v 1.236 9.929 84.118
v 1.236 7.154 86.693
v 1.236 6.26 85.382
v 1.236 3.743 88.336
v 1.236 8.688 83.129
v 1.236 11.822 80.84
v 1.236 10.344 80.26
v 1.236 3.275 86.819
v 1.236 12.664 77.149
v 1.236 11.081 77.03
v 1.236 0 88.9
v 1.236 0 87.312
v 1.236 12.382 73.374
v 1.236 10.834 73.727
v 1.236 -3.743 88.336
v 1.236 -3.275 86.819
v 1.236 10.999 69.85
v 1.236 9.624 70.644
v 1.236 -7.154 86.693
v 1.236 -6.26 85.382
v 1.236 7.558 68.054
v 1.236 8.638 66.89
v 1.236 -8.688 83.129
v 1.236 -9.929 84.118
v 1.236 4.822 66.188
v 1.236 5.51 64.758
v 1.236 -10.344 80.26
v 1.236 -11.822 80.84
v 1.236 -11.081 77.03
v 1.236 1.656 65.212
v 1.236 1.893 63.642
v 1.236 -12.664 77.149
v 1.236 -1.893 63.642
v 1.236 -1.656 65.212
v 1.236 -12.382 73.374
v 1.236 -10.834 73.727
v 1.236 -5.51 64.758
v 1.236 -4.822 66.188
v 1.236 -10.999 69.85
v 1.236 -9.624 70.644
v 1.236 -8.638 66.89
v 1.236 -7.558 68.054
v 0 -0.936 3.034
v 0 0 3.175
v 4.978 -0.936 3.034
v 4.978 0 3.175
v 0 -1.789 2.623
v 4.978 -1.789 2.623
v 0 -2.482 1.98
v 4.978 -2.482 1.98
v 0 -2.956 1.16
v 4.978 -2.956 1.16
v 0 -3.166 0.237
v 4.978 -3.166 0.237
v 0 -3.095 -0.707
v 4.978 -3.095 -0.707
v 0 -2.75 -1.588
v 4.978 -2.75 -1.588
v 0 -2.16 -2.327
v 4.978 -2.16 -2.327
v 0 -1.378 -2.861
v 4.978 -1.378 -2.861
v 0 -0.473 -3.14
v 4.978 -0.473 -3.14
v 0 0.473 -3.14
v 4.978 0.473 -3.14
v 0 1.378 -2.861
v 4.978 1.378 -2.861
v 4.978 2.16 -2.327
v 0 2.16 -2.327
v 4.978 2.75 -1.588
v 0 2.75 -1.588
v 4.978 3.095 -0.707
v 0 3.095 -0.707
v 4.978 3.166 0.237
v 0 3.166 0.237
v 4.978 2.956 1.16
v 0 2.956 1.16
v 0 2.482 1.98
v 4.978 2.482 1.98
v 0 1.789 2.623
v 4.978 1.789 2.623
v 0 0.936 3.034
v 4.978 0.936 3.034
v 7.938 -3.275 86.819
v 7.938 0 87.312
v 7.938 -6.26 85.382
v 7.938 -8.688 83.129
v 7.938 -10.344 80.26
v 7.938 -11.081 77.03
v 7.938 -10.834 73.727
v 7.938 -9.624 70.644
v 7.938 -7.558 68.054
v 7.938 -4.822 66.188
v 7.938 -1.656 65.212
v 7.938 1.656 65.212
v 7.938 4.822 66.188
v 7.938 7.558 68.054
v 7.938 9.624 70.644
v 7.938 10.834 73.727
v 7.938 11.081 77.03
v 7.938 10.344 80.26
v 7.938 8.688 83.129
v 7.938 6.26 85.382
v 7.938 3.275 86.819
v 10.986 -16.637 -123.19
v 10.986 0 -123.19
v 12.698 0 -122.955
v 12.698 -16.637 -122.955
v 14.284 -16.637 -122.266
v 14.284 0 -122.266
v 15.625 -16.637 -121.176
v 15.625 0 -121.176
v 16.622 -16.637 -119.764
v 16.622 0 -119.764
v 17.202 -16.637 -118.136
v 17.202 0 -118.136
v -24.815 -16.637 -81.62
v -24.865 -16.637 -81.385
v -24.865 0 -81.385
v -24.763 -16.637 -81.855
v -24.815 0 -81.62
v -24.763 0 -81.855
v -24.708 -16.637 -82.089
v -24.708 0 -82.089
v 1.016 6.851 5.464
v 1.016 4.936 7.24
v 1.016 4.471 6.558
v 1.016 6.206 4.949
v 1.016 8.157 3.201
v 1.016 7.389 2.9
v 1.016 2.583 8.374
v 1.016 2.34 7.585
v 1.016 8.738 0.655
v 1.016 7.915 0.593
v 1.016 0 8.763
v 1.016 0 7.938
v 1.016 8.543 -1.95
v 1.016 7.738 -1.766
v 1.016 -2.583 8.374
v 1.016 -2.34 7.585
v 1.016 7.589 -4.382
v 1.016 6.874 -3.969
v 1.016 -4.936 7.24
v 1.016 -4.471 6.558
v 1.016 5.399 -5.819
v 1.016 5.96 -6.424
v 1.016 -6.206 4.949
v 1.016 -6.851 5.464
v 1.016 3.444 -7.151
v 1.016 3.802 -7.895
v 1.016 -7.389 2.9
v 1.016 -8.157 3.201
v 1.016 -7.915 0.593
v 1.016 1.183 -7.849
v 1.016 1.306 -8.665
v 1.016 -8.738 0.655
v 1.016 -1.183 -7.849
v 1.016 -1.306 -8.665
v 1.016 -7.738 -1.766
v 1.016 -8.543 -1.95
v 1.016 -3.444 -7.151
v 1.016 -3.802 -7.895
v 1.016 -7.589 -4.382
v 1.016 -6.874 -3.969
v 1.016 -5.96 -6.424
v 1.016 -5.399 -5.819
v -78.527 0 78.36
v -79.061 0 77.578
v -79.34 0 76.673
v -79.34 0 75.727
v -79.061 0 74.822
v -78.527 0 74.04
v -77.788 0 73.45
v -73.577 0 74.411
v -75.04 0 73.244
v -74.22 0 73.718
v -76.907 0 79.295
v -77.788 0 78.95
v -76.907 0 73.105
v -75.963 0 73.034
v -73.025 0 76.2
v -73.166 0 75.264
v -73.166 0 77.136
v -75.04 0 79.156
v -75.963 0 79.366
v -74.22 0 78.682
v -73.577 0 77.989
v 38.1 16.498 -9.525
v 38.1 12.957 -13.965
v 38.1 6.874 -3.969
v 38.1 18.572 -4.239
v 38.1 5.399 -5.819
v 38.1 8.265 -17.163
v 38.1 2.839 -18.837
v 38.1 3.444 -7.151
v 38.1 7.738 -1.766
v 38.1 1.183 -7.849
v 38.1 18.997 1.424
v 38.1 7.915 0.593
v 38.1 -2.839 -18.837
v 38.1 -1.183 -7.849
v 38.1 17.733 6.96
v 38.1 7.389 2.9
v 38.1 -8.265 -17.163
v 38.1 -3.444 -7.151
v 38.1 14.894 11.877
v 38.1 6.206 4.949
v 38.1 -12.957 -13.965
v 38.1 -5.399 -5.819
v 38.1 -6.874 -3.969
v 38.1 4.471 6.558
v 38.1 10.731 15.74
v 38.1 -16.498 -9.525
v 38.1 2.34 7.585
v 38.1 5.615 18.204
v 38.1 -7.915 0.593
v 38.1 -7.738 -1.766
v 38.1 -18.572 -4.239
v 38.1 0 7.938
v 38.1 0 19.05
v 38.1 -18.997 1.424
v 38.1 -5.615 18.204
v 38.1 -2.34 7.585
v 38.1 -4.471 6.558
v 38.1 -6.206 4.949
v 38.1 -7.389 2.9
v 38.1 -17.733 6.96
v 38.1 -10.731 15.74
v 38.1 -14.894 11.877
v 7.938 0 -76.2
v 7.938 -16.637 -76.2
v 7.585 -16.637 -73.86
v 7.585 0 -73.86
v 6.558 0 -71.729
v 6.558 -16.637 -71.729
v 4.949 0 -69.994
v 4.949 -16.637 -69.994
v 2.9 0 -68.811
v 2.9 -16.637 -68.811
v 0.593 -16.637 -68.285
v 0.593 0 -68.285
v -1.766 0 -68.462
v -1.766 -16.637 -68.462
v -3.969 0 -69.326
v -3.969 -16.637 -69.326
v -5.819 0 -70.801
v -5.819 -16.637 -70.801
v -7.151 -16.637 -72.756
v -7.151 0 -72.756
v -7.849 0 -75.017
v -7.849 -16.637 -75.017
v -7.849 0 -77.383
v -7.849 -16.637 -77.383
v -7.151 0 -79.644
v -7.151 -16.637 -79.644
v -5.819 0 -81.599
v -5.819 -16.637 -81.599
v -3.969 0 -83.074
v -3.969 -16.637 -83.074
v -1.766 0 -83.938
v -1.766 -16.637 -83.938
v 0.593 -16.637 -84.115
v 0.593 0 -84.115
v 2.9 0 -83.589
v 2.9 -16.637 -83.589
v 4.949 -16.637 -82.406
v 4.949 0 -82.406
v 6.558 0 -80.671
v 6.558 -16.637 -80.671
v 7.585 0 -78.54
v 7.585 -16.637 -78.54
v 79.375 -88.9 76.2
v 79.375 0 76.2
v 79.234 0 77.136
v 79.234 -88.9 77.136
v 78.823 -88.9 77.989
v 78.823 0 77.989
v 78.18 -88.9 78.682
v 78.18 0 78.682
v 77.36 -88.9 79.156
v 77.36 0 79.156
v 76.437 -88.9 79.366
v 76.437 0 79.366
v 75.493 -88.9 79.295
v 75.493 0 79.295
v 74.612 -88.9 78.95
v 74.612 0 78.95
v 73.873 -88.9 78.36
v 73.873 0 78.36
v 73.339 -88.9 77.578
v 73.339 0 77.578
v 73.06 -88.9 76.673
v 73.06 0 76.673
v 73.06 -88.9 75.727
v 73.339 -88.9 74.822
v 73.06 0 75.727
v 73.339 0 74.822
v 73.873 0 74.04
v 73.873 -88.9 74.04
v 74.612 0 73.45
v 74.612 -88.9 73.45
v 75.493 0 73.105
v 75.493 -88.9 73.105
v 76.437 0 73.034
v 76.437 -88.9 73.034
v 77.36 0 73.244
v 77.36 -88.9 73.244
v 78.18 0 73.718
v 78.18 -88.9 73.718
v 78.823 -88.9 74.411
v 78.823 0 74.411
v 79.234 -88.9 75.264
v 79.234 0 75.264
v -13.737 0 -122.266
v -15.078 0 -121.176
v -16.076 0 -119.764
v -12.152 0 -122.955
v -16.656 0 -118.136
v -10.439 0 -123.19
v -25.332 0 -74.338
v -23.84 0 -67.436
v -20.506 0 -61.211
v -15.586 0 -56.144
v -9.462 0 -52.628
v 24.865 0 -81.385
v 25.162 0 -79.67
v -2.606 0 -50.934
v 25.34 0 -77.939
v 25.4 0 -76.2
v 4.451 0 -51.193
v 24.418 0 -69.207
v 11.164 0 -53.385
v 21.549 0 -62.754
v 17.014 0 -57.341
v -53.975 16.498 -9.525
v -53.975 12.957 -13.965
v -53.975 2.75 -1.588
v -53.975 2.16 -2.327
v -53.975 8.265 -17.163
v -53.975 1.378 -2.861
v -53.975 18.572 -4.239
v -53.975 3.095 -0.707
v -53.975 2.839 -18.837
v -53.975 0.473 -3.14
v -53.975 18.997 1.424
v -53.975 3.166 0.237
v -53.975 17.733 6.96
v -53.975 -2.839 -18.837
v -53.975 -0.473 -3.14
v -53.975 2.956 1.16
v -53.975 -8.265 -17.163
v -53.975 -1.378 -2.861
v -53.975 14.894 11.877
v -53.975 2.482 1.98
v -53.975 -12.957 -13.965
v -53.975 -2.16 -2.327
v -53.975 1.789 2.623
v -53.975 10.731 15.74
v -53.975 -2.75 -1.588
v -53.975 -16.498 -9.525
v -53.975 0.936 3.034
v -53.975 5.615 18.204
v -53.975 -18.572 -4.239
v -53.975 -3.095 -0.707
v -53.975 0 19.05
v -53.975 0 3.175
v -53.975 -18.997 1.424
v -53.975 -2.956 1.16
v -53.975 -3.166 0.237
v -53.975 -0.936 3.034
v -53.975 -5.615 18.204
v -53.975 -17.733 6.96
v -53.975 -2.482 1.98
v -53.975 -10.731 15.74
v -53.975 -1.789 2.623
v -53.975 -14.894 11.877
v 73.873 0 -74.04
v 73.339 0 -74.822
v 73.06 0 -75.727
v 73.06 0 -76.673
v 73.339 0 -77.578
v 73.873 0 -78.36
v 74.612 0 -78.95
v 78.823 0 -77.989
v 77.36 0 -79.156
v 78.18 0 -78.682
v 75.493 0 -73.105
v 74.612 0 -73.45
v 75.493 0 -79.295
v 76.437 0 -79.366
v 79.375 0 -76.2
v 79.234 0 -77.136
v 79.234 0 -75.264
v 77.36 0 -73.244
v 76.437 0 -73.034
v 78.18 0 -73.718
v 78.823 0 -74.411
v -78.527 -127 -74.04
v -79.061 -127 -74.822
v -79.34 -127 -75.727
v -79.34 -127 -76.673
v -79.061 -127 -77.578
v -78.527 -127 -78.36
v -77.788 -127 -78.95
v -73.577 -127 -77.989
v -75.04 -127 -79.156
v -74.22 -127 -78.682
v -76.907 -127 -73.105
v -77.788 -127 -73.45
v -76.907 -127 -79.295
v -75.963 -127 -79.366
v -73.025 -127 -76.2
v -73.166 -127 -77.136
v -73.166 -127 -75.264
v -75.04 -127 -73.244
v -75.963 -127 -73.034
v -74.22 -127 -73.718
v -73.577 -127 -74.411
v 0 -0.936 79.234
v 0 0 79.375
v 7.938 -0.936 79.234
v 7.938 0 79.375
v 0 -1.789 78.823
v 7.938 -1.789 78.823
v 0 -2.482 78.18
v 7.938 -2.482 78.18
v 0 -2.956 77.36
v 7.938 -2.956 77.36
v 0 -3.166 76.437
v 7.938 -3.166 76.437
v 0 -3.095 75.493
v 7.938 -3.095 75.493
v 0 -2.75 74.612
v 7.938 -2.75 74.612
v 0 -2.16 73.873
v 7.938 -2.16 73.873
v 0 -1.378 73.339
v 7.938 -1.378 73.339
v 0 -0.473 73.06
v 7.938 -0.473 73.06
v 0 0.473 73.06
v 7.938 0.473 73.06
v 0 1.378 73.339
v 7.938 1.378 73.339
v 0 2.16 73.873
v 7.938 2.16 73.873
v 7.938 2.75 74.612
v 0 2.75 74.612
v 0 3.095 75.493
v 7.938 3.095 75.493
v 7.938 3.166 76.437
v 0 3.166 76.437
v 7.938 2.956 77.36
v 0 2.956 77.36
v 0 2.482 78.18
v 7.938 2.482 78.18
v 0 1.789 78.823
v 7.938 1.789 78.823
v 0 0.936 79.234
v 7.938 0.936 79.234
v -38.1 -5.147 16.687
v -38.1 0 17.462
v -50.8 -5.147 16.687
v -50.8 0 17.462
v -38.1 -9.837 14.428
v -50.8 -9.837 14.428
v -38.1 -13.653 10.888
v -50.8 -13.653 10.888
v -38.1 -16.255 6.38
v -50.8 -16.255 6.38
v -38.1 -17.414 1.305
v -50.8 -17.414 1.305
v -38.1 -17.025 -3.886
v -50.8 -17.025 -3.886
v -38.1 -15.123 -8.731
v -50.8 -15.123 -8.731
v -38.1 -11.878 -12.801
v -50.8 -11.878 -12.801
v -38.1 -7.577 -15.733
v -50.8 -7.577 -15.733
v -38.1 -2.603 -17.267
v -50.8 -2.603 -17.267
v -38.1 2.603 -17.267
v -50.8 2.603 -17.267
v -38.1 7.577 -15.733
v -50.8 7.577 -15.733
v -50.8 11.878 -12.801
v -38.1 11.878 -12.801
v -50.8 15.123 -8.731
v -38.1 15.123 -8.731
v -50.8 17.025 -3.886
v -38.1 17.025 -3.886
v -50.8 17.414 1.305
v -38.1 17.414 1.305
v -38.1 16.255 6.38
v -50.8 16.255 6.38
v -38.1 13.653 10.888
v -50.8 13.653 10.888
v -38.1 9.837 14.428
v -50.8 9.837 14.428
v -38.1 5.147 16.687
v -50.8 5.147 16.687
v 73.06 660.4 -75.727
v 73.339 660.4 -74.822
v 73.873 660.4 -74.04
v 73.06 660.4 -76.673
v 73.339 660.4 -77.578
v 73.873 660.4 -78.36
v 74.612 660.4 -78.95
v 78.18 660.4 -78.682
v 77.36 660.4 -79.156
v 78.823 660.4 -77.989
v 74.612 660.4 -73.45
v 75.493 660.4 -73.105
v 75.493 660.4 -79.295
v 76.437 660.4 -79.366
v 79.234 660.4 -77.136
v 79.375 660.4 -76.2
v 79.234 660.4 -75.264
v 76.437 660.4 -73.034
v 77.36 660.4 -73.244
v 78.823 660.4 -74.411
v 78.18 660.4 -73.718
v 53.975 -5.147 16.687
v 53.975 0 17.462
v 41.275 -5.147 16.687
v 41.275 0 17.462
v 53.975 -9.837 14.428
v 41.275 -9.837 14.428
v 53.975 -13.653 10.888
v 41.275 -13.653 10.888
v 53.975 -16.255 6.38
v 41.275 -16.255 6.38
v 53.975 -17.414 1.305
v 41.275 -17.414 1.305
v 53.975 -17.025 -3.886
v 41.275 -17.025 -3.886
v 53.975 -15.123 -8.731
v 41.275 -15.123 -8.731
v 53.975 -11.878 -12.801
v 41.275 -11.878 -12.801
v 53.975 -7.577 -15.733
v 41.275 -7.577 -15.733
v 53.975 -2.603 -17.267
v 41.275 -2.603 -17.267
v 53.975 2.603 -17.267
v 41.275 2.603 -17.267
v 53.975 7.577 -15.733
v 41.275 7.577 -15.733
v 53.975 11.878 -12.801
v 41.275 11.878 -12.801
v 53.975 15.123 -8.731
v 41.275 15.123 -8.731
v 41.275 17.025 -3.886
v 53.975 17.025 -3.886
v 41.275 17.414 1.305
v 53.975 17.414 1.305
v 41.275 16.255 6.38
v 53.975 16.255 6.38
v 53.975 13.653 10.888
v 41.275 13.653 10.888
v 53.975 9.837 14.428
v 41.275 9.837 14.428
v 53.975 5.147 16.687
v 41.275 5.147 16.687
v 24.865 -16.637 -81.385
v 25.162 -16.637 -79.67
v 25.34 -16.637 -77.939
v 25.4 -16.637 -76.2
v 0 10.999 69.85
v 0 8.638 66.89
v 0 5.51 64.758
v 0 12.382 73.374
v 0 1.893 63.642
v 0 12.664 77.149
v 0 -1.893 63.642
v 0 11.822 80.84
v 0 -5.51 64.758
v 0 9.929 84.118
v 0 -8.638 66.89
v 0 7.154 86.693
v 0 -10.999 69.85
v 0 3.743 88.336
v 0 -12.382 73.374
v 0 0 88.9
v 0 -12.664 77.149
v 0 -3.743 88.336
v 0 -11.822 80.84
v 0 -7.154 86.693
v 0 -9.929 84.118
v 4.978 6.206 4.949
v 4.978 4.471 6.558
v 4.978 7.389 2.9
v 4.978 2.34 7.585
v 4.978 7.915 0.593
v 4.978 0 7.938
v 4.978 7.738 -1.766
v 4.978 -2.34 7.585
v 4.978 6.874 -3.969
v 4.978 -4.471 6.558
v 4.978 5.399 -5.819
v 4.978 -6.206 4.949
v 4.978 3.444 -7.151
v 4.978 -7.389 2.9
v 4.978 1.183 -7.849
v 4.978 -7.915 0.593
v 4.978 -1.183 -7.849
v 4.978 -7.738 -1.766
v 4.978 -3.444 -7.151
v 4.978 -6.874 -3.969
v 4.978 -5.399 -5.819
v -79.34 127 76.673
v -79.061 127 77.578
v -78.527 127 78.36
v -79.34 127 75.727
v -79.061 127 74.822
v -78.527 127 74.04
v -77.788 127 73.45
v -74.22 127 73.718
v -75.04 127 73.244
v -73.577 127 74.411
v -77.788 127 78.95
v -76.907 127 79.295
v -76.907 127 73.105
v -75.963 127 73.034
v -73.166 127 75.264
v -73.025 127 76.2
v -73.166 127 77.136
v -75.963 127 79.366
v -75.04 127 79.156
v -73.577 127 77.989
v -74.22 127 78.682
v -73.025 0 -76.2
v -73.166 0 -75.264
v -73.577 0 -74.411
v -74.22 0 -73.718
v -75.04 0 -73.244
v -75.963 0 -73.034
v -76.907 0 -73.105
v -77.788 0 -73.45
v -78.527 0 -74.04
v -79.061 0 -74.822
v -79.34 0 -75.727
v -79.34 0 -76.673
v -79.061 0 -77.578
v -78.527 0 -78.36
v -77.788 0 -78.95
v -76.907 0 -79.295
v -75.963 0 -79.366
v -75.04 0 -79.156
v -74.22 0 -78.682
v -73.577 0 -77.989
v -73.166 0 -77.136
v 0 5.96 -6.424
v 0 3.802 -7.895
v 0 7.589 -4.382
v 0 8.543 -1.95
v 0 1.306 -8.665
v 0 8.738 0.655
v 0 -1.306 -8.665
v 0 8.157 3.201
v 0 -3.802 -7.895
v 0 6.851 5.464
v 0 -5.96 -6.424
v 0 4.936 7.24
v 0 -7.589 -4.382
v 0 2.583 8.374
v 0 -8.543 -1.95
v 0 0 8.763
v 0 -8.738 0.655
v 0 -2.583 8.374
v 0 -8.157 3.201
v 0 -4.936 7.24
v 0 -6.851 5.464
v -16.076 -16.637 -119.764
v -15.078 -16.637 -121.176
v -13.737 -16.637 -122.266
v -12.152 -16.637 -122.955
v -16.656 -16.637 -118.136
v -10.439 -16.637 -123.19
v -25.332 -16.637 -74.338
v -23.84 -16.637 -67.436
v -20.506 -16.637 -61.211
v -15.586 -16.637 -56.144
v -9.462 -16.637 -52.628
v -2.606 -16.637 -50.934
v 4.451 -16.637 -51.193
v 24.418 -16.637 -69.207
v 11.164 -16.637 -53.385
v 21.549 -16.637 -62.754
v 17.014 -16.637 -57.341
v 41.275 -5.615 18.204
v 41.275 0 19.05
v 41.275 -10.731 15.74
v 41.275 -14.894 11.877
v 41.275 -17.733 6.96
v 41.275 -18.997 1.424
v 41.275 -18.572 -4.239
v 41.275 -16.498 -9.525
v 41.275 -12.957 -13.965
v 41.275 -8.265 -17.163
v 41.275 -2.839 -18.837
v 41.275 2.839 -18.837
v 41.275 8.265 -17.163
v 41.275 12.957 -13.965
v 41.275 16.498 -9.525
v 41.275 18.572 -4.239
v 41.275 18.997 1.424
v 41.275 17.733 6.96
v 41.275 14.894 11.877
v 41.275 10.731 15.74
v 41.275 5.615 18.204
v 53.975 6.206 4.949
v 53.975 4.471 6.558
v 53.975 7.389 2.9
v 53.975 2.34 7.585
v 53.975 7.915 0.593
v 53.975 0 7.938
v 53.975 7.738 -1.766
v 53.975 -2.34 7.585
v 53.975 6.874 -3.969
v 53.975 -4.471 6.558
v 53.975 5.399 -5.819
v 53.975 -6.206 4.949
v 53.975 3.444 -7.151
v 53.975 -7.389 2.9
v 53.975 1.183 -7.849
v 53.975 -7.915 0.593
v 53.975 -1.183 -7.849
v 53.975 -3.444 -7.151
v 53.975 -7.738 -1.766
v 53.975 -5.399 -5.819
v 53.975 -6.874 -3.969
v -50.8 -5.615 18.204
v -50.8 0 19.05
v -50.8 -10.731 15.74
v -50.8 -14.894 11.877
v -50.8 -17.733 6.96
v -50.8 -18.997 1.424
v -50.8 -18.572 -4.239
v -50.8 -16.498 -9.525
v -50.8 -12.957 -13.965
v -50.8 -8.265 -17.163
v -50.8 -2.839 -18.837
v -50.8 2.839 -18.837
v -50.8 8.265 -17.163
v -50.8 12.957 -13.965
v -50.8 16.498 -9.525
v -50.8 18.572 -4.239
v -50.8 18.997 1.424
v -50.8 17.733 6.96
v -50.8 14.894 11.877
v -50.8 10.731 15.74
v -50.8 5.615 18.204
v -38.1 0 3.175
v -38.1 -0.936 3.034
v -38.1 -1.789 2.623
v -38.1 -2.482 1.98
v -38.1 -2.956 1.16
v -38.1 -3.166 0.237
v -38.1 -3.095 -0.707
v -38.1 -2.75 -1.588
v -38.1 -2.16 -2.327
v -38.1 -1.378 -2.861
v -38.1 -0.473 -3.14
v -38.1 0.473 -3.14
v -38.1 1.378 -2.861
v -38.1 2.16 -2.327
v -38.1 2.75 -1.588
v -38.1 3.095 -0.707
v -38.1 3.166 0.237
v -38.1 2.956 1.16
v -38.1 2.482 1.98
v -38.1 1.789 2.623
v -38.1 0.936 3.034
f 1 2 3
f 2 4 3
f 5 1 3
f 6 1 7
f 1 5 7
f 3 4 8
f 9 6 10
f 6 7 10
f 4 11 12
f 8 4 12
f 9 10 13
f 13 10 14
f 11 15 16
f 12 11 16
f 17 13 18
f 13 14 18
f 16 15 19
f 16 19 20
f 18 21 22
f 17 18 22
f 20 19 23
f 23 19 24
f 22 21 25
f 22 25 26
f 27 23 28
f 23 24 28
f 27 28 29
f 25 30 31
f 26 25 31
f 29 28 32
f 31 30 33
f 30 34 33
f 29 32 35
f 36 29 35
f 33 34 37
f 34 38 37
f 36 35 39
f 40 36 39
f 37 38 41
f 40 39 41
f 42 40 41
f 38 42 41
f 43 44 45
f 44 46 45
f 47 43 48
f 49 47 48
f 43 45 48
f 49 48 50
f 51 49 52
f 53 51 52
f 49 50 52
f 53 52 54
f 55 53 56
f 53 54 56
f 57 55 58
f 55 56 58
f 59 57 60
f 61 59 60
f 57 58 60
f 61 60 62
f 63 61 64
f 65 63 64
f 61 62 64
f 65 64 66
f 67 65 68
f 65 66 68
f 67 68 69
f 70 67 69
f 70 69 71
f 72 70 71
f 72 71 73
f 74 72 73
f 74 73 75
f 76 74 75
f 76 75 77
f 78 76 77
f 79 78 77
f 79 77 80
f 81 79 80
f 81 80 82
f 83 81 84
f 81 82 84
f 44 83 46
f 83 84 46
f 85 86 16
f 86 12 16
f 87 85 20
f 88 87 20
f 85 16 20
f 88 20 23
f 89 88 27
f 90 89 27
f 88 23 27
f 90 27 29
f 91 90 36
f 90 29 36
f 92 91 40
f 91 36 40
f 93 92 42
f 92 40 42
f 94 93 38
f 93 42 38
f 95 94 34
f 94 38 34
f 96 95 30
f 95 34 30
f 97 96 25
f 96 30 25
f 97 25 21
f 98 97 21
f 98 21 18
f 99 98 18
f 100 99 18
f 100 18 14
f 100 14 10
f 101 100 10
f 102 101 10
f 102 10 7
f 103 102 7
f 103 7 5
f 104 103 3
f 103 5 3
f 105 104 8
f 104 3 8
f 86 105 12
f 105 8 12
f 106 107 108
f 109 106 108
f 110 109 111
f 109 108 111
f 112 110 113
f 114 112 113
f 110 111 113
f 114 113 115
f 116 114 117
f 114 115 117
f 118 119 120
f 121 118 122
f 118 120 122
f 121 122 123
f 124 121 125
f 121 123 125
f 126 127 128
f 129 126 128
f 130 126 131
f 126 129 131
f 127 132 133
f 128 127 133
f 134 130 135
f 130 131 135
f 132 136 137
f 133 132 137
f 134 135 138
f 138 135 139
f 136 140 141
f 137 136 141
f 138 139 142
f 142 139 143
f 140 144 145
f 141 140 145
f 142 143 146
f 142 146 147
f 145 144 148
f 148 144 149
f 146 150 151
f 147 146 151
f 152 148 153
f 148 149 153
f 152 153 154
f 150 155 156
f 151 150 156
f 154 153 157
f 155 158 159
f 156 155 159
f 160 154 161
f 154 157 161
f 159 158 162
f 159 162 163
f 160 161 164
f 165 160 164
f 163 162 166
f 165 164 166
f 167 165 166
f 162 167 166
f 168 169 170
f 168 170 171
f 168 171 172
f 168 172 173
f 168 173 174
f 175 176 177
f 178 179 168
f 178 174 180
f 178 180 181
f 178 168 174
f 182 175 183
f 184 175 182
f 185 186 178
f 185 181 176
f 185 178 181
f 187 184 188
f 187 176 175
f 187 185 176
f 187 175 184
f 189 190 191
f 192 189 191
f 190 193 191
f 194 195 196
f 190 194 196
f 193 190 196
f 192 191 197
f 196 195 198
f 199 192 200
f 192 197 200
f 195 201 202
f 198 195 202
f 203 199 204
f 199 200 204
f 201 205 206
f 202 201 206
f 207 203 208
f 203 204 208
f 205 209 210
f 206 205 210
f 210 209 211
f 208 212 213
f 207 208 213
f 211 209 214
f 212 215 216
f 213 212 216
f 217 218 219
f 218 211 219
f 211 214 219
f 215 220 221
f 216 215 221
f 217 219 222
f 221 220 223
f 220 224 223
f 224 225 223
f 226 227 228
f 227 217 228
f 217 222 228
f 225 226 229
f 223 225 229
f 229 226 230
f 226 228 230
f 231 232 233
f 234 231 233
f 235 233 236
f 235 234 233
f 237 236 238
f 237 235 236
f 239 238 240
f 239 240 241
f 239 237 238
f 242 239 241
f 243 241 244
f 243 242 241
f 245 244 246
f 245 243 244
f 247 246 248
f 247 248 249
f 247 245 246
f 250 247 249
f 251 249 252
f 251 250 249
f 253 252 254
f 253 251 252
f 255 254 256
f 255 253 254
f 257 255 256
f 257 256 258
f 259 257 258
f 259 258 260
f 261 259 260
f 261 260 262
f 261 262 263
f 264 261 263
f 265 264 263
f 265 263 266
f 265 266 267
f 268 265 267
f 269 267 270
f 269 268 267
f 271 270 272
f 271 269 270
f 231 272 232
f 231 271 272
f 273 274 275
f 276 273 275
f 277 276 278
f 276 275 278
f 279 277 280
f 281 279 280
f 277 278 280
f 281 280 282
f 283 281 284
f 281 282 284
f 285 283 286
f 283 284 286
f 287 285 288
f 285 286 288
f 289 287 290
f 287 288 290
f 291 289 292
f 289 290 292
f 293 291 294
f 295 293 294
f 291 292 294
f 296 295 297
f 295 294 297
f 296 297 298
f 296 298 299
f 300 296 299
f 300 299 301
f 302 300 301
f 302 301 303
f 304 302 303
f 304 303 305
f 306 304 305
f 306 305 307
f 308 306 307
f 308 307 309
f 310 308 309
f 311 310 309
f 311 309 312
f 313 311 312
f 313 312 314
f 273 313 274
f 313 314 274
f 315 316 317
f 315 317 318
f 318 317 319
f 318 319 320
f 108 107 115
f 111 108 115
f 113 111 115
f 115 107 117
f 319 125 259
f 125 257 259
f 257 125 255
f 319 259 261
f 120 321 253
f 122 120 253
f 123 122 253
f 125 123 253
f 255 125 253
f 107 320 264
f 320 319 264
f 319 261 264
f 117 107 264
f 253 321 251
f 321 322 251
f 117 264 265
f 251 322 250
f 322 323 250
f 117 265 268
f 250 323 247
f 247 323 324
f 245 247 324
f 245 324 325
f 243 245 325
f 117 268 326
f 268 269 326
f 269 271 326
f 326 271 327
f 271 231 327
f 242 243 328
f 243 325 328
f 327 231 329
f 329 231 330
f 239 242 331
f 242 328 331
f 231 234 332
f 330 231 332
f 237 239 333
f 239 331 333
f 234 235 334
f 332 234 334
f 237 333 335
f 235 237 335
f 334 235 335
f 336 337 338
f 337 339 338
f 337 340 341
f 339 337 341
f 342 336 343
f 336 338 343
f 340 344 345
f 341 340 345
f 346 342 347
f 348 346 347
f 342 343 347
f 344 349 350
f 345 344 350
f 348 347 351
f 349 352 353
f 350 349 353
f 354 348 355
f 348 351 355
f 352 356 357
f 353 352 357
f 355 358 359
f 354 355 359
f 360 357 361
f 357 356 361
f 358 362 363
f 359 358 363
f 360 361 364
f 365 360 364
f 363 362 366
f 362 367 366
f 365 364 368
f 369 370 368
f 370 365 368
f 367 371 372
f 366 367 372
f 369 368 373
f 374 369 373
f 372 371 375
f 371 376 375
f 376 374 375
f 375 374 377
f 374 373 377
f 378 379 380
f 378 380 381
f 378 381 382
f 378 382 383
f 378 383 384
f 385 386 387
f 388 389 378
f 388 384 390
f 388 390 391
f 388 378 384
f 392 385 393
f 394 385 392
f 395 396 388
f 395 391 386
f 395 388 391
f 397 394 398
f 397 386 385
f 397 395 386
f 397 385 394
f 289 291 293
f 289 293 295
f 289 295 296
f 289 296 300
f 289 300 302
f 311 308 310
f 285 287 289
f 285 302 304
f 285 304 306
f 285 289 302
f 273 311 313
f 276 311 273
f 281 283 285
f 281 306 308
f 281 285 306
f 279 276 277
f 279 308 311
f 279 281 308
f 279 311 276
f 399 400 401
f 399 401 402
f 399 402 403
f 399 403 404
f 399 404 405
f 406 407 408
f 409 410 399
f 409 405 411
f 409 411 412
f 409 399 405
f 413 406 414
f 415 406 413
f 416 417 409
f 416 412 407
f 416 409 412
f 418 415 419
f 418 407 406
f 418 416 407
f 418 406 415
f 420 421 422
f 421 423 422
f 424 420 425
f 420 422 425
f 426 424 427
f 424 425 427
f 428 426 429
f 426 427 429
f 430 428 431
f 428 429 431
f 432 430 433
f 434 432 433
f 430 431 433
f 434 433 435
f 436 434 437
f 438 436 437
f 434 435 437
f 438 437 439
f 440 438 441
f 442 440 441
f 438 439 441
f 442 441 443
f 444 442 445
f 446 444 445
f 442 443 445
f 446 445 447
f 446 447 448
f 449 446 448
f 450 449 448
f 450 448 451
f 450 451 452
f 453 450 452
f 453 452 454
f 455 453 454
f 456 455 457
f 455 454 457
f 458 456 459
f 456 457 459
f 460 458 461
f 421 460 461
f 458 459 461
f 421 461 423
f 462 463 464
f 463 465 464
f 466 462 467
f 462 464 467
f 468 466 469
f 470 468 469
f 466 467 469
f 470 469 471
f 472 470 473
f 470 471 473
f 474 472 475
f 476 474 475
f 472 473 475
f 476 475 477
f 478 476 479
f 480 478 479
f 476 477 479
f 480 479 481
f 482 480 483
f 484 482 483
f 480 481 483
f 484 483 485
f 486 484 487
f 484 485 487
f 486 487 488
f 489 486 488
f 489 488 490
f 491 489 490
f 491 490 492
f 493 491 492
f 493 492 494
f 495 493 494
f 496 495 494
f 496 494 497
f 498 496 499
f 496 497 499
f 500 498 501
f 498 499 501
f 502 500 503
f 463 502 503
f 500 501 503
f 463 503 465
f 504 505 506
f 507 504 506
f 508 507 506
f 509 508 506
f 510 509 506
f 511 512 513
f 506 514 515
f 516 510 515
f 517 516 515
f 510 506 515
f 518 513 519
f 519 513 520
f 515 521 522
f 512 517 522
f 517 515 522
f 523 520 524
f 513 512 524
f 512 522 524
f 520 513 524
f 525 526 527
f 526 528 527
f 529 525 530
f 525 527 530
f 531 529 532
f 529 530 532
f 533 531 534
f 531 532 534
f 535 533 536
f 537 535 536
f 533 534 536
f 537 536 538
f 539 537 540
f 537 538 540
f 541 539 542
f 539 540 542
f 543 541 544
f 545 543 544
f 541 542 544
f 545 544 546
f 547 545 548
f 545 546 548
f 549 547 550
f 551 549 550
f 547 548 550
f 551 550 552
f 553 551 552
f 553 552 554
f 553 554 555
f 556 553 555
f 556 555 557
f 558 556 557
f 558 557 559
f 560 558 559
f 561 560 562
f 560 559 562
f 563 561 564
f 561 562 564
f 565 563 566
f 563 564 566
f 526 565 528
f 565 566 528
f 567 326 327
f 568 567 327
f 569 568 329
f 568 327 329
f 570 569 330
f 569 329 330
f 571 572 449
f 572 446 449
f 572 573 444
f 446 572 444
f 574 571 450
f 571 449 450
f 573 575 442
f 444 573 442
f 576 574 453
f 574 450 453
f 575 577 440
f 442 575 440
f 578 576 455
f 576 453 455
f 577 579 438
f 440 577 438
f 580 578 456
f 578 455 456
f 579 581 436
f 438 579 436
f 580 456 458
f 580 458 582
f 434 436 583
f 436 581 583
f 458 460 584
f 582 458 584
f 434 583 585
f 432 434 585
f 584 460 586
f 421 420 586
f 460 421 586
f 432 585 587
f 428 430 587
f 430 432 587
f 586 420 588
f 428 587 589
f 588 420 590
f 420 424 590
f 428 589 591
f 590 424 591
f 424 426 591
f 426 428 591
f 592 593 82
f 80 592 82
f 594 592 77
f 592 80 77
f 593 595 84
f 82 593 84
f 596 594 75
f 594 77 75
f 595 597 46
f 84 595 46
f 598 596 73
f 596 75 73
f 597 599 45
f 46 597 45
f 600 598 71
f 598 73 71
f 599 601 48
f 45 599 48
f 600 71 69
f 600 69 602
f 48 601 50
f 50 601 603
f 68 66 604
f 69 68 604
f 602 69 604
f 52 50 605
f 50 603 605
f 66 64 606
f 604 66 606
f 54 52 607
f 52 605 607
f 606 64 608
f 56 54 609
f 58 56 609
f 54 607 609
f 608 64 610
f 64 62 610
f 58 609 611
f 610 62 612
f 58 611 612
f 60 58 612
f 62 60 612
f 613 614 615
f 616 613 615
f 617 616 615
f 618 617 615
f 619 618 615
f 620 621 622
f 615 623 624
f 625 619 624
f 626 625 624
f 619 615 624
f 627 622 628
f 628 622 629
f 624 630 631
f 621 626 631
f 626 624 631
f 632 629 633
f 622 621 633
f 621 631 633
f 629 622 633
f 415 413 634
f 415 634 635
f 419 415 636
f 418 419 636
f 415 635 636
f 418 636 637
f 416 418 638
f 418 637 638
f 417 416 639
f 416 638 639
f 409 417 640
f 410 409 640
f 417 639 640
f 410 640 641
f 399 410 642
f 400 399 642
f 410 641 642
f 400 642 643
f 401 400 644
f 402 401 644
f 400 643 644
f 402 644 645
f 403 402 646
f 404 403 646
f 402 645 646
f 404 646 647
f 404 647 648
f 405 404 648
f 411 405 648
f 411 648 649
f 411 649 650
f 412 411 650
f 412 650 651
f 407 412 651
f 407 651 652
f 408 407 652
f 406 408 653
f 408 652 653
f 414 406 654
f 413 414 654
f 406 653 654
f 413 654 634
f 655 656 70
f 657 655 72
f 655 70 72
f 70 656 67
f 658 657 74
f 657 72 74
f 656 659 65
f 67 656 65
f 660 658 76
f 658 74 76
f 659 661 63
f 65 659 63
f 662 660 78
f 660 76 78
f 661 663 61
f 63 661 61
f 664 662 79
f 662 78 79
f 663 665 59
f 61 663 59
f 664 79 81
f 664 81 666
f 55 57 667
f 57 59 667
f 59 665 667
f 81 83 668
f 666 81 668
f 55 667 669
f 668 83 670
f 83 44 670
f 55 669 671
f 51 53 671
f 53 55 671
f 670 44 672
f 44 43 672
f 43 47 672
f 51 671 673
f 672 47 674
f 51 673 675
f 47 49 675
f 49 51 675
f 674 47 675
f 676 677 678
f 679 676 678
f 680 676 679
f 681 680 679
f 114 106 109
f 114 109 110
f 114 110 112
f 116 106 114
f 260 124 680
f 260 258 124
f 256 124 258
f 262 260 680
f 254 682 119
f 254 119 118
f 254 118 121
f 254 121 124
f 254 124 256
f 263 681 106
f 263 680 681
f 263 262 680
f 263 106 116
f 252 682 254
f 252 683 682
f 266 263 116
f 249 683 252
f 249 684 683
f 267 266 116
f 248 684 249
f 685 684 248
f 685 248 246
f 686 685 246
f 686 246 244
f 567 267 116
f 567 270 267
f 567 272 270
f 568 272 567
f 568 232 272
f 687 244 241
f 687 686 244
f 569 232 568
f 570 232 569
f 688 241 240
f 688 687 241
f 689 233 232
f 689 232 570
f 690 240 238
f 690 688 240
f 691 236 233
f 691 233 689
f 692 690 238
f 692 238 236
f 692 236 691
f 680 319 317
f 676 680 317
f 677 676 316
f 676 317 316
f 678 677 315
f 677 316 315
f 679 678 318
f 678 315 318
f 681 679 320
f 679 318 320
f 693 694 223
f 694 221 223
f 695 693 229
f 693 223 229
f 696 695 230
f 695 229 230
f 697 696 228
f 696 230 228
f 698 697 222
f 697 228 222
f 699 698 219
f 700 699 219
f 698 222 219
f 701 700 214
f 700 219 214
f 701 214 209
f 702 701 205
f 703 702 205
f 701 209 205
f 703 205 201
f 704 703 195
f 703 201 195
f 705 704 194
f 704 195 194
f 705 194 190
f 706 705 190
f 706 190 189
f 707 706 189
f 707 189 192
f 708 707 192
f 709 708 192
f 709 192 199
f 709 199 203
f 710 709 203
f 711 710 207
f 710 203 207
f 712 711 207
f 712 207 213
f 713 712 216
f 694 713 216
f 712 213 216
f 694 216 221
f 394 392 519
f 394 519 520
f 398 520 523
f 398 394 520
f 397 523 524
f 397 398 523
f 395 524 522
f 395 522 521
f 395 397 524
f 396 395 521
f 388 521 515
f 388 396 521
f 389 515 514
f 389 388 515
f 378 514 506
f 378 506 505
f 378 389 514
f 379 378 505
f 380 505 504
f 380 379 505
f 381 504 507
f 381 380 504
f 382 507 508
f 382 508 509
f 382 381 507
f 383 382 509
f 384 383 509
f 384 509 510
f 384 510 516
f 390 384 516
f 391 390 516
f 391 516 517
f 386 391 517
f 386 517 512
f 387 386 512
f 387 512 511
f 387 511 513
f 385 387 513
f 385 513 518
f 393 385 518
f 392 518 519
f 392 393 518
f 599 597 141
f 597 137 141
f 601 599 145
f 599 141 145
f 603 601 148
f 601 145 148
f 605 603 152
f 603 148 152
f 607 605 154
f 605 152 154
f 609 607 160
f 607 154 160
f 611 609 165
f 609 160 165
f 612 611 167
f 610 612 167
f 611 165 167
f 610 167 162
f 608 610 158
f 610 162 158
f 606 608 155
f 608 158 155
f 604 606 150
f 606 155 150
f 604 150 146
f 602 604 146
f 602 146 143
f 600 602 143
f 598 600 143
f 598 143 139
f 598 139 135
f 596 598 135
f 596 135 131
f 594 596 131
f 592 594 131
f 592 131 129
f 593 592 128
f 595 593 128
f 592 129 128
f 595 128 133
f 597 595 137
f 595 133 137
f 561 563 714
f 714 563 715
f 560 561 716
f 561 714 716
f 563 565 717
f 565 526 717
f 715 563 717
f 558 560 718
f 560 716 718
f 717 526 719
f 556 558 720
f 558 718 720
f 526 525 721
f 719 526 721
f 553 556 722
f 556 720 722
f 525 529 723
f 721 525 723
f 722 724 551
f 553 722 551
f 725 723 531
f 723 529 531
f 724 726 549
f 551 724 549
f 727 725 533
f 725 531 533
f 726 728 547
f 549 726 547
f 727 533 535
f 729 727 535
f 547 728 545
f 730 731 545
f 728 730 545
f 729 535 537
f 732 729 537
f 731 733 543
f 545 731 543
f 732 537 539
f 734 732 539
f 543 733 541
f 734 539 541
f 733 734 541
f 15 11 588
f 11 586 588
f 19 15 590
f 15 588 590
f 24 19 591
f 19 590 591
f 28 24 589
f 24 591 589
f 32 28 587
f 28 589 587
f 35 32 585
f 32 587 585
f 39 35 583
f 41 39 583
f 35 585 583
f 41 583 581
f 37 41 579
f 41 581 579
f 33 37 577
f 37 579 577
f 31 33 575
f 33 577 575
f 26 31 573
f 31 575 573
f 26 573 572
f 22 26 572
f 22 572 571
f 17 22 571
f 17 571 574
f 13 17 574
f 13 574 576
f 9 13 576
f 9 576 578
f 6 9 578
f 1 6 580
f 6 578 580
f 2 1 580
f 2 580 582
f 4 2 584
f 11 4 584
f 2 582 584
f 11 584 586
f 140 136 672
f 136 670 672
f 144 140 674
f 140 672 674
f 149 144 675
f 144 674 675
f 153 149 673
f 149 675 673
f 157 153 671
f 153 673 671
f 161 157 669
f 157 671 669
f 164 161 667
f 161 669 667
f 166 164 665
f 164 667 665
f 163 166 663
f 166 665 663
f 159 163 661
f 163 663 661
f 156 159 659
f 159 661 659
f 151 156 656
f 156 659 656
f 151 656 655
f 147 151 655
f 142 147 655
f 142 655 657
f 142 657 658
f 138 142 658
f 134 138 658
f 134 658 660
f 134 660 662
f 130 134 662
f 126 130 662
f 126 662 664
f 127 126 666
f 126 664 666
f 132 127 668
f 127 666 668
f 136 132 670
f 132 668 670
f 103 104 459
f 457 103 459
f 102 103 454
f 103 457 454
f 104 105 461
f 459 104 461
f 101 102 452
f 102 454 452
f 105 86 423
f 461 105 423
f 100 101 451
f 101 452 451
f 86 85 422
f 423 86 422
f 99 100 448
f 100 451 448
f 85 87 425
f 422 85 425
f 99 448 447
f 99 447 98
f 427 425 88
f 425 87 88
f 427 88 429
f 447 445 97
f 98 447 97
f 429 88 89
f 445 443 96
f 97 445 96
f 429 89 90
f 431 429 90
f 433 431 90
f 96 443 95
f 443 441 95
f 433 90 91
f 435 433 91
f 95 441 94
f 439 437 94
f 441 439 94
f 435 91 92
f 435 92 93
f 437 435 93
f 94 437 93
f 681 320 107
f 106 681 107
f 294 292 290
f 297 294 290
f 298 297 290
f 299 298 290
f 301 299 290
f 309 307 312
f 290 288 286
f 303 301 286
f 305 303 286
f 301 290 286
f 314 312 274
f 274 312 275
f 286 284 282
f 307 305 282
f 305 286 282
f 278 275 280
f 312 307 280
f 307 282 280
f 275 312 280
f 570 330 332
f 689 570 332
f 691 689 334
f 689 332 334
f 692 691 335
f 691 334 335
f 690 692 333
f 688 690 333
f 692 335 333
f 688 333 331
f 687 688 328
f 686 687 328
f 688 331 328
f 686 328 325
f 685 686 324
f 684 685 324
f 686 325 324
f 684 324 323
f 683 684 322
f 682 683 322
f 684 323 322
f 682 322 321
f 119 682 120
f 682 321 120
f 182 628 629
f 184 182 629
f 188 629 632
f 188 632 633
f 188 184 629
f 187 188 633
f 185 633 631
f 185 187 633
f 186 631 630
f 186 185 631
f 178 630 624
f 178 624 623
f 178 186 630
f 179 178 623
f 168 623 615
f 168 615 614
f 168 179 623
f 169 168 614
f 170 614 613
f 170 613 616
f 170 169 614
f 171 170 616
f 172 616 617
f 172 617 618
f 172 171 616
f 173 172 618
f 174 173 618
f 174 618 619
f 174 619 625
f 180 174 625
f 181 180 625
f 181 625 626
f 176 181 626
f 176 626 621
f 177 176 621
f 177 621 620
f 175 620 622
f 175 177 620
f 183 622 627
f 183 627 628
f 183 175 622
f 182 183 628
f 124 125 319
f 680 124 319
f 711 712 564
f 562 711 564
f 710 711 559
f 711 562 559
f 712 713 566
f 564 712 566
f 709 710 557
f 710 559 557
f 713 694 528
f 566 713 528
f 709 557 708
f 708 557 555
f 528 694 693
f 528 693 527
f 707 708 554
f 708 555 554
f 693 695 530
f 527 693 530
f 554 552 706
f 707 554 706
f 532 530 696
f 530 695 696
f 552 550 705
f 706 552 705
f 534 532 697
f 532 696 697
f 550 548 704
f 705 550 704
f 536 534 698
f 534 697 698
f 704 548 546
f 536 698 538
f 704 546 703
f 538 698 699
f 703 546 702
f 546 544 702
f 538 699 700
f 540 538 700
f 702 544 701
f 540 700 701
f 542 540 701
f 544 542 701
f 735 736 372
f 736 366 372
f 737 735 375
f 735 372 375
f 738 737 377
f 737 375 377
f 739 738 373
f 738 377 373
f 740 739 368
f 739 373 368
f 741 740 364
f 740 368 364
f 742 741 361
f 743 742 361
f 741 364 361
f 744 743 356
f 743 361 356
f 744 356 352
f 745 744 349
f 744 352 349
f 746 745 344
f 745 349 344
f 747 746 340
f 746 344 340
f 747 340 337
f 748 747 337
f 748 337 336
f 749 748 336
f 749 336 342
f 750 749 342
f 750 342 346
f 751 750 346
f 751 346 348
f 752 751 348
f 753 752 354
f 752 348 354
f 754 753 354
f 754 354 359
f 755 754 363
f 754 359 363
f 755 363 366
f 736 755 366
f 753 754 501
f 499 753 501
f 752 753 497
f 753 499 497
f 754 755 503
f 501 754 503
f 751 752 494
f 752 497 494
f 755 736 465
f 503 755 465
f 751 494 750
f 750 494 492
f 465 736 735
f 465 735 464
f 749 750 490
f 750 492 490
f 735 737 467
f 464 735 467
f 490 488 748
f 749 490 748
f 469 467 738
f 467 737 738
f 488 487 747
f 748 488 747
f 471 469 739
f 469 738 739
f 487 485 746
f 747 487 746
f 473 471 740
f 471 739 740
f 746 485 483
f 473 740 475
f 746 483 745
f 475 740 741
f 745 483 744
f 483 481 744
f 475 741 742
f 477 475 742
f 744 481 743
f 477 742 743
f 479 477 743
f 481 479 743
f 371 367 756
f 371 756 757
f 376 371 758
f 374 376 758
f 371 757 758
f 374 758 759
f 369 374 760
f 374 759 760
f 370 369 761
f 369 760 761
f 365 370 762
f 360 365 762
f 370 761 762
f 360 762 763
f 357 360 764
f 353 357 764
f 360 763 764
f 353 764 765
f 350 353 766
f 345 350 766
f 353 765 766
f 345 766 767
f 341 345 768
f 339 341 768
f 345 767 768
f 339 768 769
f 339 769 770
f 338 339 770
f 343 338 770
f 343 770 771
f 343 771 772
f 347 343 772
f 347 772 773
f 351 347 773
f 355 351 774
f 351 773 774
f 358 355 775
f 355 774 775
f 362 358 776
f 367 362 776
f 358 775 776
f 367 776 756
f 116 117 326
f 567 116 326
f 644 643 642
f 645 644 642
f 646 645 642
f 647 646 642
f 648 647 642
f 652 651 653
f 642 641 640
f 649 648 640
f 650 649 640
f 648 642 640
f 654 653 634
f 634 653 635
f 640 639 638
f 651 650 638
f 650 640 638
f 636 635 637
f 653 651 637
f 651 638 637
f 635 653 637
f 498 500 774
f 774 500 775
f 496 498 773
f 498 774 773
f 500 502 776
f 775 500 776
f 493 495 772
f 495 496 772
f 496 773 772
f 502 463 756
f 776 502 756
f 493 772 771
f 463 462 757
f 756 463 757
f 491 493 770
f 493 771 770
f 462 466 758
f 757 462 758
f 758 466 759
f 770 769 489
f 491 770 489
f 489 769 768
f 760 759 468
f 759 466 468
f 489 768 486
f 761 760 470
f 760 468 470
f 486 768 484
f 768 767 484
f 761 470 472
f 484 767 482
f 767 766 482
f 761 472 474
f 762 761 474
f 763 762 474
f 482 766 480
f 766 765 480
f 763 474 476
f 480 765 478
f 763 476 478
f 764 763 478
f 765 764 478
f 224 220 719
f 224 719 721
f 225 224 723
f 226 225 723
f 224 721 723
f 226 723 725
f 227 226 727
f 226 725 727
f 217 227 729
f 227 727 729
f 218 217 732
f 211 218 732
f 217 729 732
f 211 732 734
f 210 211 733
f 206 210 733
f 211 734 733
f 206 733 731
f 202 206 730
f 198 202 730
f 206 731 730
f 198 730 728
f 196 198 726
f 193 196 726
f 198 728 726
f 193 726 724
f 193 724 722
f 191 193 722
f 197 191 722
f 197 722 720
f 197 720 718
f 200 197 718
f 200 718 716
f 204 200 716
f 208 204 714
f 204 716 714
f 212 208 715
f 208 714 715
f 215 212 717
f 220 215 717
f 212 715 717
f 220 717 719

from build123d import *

# Parameters (mm, degrees)
F4_R      = 3.175
F5_DEPTH  = 127
F6_R      = 3.175
F7_DEPTH  = 88.9
F8_R      = 3.175
F9_DEPTH  = 127
F12_R     = 7.9375
F13_DEPTH = 16.637
F16_R     = 3.175
F17_DEPTH = 660.4


with BuildPart() as f1:
    # F0 (on Front) → F1 (revolve)
    with BuildSketch(Plane.XZ):
        Polygon((0, 8.763), (0, 3.175), (4.9784, 3.175), (4.9784, 7.9375), (1.016, 7.9375), (1.016, 8.763), align=None)
    revolve(axis=Axis((8.98404, 0, 0), (1, 0, 0)))


with BuildPart() as f3:
    # F2 (on Front) → F3 (revolve)
    with BuildSketch(Plane.XZ):
        Polygon((38.1, 19.05), (38.1, 7.9375), (53.975, 7.9375), (53.975, 17.4625), (41.275, 17.4625), (41.275, 19.05), align=None)
    revolve(axis=Axis((38.233172, 0, 0), (1, 0, 0)))


with BuildPart() as f5:
    # F4 (on Front) → F5 (new body)
    with BuildSketch(Plane.XZ):
        with Locations((-76.2, 76.2)):
            Circle(F4_R)
    extrude(amount=-F5_DEPTH)


with BuildPart() as f7:
    # F6 (on Front) → F7 (new body)
    with BuildSketch(Plane.XZ):
        with Locations((76.2, 76.2)):
            Circle(F6_R)
    extrude(amount=F7_DEPTH)


with BuildPart() as f9:
    # F8 (on Front) → F9 (new body)
    with BuildSketch(Plane.XZ):
        with Locations((-76.2, -76.2)):
            Circle(F8_R)
    extrude(amount=F9_DEPTH)


with BuildPart() as f11:
    # F10 (on Front) → F11 (revolve)
    with BuildSketch(Plane.XZ):
        Polygon((-50.8, 19.05), (-53.975, 19.05), (-53.975, 3.175), (-38.1, 3.175), (-38.1, 17.4625), (-50.8, 17.4625), align=None)
    revolve(axis=Axis((-46.393437, 0, 0), (1, 0, 0)))


with BuildPart() as f13:
    # F12 (on Front) → F13 (new body)
    with BuildSketch(Plane.XZ):
        with BuildLine():
            ThreePointArc((24.865197, -81.384784), (25.265945, -78.806147), (25.4, -76.2))
            ThreePointArc((25.4, -76.2), (-2.606147, -50.934055), (-24.865197, -81.384784))
            Line((-24.865197, -81.384784), (-24.707914, -82.088887))
            ThreePointArc((-24.707914, -82.088887), (0.360728, -101.597438), (24.865197, -81.384784))
        make_face()
        with Locations((0, -76.2)):
            Circle(F12_R, mode=Mode.SUBTRACT)
        with BuildLine():
            Line((-24.707914, -82.088887), (-24.865197, -81.384784))
            ThreePointArc((-24.865197, -81.384784), (-24.789055, -81.737394), (-24.707914, -82.088887))
        make_face()
        with BuildLine():
            Line((17.20195, -118.136196), (24.865197, -81.384784))
            ThreePointArc((24.865197, -81.384784), (0.360728, -101.597438), (-24.707914, -82.088887))
            Line((-24.707914, -82.088887), (-16.655645, -118.136196))
            ThreePointArc((-16.655645, -118.136196), (-14.44507, -121.767136), (-10.439345, -123.19))
            Line((-10.439345, -123.19), (10.985651, -123.19))
            ThreePointArc((10.985651, -123.19), (14.991376, -121.767136), (17.20195, -118.136196))
        make_face()
    extrude(amount=F13_DEPTH)


with BuildPart() as f15:
    # F14 (on Front) → F15 (revolve)
    with BuildSketch(Plane.XZ):
        Polygon((1.236345, 88.9), (0, 88.9), (0, 79.375), (7.9375, 79.375), (7.9375, 87.3125), (1.236345, 87.3125), align=None)
    revolve(axis=Axis((-0.252744, 0, 76.2), (1, 0, 0)))


with BuildPart() as f17:
    # F16 (on Front) → F17 (new body)
    with BuildSketch(Plane.XZ):
        with Locations((76.2, -76.2)):
            Circle(F16_R)
    extrude(amount=-F17_DEPTH)


solid = Compound([f1.part, f3.part, f5.part, f7.part, f9.part, f11.part, f13.part, f15.part, f17.part])
